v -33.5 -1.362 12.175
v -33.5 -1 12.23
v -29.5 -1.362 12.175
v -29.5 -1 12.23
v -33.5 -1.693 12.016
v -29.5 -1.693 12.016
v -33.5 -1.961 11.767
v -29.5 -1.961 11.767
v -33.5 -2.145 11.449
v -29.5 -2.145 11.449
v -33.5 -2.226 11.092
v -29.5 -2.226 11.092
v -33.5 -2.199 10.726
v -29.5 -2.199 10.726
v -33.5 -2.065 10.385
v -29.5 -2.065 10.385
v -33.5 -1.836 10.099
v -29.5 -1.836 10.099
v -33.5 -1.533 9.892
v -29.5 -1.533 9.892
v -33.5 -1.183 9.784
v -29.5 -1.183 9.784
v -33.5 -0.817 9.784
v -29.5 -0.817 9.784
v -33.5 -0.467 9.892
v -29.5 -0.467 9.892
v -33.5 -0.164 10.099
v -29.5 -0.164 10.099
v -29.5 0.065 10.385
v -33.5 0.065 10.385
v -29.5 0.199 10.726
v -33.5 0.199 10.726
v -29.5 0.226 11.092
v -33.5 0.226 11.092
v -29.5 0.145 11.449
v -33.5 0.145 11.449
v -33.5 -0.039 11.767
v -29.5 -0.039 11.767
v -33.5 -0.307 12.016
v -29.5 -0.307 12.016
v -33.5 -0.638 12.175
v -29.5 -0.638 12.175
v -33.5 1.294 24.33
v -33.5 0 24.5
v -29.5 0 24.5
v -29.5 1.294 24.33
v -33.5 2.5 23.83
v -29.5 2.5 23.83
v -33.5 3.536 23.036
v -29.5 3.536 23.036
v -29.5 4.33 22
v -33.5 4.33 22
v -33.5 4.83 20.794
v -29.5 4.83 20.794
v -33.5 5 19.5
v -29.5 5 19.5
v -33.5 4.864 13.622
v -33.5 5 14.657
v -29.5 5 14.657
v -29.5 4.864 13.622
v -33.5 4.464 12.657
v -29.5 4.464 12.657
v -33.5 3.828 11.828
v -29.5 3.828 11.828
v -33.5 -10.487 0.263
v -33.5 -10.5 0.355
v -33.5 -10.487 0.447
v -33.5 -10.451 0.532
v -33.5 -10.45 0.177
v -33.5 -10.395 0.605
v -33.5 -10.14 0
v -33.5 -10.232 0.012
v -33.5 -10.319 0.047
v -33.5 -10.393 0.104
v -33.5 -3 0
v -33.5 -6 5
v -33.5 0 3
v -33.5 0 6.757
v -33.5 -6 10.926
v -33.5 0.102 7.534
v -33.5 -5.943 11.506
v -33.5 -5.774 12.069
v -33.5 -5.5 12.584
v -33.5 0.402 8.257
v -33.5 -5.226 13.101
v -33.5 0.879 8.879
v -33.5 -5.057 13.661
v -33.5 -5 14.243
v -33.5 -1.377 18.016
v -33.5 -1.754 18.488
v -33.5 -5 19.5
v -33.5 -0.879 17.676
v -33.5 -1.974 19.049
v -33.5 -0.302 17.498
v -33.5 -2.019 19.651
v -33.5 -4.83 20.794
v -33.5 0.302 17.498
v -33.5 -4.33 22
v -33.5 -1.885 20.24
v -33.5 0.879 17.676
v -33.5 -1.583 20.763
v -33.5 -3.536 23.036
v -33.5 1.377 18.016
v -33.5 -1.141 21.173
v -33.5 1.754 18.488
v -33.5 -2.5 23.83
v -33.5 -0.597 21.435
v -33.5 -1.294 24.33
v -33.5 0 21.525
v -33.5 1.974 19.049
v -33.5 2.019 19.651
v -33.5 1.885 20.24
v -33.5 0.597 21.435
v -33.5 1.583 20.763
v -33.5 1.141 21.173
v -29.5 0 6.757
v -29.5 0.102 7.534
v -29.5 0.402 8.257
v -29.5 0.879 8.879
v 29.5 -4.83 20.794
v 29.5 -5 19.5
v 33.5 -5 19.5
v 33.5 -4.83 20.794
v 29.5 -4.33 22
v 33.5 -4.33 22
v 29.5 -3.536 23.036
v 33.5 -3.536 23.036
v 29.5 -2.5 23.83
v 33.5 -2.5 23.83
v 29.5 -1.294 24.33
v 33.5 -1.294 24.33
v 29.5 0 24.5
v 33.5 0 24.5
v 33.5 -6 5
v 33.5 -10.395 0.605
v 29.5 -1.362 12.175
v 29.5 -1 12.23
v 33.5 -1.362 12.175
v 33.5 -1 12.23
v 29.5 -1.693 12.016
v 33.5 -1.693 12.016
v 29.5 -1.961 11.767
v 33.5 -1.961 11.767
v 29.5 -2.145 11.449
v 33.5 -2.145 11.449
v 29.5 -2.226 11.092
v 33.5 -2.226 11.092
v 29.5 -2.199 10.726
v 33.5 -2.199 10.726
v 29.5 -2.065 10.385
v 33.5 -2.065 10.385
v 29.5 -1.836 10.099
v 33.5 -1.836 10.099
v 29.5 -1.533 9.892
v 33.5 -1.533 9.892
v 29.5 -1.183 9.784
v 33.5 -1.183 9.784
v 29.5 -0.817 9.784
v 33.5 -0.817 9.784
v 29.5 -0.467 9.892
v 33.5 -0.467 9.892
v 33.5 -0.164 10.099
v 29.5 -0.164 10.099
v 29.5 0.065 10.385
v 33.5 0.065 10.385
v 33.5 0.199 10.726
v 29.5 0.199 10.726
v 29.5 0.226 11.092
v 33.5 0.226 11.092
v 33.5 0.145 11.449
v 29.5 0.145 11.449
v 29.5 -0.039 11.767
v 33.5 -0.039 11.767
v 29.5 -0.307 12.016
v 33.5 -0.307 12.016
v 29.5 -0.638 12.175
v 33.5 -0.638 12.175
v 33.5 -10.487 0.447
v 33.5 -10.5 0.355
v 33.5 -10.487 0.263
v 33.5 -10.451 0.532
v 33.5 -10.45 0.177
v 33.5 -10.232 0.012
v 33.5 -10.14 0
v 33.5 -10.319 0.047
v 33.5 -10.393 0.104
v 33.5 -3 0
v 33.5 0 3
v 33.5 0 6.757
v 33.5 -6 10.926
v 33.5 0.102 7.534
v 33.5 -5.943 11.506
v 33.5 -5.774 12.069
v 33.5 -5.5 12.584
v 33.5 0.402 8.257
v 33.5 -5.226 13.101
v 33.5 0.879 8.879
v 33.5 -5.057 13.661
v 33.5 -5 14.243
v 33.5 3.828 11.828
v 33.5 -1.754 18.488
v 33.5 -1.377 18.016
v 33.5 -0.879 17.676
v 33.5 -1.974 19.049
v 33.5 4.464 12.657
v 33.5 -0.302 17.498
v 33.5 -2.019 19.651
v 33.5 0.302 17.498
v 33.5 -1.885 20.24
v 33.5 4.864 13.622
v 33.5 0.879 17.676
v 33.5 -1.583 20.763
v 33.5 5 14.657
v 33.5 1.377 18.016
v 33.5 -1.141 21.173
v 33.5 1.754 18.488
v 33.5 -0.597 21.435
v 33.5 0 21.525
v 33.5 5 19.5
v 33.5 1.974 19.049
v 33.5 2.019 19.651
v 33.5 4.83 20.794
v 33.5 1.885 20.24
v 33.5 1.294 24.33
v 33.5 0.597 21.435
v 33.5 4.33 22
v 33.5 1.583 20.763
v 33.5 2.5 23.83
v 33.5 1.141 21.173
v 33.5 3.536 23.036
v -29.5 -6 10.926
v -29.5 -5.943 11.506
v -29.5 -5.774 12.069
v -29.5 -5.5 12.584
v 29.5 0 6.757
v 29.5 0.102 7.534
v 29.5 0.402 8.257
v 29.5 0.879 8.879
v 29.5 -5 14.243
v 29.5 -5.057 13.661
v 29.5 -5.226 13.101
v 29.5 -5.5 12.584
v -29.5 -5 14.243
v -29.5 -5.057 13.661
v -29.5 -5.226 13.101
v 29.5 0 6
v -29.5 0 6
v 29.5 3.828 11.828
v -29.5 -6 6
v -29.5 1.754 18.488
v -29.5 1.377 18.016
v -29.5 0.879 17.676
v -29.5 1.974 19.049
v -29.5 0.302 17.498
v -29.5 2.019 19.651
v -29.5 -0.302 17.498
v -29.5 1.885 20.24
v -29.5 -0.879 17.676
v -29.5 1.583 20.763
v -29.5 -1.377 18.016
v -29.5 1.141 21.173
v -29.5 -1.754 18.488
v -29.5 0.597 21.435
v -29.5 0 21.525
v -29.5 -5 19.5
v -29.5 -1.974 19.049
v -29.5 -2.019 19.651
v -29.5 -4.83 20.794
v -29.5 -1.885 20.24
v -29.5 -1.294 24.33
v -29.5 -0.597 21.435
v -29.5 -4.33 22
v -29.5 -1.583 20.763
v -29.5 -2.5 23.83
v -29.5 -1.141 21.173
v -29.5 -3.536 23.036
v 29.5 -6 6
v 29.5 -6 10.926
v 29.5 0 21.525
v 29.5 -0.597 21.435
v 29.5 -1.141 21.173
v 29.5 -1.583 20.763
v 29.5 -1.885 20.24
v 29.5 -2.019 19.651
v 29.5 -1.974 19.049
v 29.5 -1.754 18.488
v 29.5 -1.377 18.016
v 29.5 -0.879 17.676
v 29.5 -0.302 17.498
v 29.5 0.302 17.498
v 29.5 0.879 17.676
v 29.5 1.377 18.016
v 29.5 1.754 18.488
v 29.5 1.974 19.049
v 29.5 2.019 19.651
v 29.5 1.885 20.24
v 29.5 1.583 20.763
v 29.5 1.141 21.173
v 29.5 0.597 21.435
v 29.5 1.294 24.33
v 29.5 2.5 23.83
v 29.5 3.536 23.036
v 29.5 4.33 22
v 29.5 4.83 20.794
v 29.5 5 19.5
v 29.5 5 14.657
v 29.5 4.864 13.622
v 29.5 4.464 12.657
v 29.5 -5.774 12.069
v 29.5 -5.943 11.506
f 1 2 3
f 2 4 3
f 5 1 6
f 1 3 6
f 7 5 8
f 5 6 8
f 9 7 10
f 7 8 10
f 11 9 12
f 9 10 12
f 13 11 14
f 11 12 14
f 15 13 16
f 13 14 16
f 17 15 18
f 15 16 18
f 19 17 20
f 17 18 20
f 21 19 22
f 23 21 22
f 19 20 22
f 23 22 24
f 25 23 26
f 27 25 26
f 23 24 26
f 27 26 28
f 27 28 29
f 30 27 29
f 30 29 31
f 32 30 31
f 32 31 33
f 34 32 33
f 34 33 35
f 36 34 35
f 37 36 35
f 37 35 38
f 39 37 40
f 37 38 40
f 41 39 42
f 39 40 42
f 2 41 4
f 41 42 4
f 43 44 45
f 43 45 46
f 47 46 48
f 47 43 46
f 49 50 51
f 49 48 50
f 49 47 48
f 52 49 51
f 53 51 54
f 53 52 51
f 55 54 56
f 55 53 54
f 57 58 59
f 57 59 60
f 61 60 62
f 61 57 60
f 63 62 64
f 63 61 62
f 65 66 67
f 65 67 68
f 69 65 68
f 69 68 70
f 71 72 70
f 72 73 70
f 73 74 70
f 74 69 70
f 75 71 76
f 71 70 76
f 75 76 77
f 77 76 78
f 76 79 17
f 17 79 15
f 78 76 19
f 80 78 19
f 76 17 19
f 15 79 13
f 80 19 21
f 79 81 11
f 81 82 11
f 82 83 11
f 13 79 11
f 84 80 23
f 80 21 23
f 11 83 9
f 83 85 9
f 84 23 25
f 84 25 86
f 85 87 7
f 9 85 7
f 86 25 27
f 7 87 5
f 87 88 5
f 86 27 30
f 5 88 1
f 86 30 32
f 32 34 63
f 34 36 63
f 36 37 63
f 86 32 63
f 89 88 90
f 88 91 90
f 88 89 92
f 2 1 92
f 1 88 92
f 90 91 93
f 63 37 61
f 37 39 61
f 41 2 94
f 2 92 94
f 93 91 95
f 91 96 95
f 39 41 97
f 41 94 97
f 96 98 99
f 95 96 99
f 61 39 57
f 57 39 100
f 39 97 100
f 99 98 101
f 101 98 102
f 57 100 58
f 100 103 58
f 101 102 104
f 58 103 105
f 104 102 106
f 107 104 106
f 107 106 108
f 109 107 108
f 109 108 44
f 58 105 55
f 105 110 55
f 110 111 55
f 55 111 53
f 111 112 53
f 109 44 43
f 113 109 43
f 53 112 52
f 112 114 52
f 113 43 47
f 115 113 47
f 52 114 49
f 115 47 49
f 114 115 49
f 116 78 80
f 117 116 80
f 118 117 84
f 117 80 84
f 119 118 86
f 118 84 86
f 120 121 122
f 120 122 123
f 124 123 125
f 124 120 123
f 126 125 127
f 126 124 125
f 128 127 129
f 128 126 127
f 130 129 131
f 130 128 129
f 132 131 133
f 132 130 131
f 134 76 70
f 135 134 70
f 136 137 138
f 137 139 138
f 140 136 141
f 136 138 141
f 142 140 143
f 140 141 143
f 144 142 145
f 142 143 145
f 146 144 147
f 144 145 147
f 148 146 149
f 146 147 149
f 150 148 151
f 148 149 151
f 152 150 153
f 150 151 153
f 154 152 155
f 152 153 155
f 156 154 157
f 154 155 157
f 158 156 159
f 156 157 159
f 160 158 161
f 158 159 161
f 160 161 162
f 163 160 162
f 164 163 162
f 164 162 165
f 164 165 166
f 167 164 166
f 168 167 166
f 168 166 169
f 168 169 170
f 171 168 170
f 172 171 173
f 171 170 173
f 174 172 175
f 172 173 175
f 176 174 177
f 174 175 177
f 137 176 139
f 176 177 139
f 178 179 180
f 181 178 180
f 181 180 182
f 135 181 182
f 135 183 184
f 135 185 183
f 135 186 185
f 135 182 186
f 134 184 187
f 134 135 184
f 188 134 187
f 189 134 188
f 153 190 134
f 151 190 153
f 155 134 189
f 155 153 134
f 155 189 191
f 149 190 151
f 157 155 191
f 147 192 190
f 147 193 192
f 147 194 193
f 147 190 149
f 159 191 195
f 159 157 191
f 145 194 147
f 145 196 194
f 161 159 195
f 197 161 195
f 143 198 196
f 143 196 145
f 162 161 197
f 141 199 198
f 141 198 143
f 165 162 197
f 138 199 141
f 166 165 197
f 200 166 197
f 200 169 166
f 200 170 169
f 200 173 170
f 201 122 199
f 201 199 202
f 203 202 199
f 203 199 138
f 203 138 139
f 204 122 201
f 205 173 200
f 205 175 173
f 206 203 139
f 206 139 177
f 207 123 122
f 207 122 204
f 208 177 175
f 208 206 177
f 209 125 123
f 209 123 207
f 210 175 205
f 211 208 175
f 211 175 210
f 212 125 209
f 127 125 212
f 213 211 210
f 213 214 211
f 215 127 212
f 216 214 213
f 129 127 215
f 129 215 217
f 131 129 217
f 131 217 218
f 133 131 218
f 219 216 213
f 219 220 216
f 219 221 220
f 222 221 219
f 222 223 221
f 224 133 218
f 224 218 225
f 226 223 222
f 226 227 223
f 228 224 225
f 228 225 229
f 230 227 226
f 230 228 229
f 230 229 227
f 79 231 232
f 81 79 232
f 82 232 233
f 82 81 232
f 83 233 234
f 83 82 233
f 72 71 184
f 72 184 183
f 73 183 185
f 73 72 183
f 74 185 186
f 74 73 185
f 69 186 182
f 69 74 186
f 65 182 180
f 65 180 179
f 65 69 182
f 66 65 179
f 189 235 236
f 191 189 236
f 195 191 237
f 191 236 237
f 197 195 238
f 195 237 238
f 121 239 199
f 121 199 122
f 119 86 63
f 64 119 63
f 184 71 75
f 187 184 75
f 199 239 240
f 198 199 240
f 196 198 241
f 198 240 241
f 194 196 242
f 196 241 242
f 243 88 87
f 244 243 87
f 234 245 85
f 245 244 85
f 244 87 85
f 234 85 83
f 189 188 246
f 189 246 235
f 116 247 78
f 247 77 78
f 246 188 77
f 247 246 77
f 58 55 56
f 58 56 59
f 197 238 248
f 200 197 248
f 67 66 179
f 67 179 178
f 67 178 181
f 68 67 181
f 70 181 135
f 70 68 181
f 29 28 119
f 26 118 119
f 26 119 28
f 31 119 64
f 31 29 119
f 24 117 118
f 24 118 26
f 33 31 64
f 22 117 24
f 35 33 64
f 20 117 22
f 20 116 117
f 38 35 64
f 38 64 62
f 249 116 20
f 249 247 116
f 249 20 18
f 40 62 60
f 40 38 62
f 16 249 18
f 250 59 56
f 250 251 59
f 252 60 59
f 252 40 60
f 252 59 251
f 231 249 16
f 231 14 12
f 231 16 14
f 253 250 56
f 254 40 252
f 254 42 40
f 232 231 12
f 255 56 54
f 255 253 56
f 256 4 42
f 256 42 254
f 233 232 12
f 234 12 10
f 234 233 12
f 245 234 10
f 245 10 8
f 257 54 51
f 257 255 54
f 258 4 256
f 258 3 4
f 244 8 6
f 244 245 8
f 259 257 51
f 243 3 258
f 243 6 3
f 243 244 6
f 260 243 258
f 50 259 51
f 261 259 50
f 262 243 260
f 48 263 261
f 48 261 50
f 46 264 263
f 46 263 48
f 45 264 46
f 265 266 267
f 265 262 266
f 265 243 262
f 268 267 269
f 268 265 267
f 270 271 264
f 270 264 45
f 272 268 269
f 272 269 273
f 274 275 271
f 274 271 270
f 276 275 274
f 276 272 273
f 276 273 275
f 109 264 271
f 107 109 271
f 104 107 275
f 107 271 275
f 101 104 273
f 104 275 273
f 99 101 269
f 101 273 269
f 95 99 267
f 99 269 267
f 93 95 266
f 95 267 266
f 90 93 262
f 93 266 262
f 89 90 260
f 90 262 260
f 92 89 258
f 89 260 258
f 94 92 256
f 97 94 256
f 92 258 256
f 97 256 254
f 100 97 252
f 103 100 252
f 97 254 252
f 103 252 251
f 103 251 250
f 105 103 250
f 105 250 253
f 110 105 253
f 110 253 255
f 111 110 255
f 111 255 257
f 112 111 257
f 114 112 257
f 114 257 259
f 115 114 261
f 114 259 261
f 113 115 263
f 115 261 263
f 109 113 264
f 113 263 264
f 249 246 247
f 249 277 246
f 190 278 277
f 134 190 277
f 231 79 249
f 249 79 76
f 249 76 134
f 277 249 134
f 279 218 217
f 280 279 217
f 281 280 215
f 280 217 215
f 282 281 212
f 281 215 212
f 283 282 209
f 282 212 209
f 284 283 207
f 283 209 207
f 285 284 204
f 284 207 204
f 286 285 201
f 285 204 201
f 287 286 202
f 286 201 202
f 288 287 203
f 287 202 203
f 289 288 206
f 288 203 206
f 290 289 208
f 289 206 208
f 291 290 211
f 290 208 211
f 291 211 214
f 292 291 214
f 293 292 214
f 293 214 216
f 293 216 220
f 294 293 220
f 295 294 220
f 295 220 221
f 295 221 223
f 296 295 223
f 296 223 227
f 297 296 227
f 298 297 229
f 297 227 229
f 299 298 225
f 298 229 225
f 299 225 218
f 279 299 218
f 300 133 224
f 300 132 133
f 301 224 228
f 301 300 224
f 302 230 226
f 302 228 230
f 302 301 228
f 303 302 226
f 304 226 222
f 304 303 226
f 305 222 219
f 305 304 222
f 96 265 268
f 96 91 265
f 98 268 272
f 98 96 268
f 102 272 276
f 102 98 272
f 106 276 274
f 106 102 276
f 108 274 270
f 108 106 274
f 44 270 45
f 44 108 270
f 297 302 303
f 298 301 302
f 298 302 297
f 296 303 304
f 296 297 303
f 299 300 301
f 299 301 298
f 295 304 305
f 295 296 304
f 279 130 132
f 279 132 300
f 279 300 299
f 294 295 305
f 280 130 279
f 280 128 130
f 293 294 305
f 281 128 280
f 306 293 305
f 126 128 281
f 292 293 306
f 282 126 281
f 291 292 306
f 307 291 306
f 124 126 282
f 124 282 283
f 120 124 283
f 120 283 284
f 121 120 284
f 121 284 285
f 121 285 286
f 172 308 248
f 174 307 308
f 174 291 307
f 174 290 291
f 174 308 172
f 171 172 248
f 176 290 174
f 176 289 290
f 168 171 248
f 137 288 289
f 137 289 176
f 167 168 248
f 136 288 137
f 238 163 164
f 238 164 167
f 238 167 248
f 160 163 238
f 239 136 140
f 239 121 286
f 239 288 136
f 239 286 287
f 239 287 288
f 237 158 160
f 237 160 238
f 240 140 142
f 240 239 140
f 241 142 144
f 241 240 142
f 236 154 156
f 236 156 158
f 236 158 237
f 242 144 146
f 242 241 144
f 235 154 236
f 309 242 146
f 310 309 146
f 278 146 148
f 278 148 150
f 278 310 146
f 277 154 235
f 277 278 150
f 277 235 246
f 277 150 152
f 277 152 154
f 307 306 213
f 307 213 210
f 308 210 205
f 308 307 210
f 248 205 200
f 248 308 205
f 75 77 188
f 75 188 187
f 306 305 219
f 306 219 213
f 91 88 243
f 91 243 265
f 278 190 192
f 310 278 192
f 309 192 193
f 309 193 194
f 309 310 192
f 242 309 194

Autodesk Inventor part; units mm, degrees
ref_plane "YZ Plane" through (0, 0, 0) normal (1, 0, 0) x (0, 1, 0)
ref_plane "XZ Plane" through (0, 0, 0) normal (0, 1, 0) x (-1, 0, 0)
ref_plane "XY Plane" through (0, 0, 0) normal (0, 0, 1) x (1, 0, 0)
sketch "Skizze1" plane through (0, 0, 0) normal (1, 0, 0) x (0, 1, 0)
  line L0 (-6, 5) -> (-10.5, 0.5)
  line L1 (-10.5, 0) -> (-3, 0)
  line L2 (0, 3) -> (0, 8)
  line L3 (-10.5, 0.5) -> (-10.5, 0)
  line L4 (0, 8) -> (5, 13)
  line L5 (0, 8) -> (0, 19.5) construction
  circle A0 centre (0, 19.5) radius 0.5
  line L6 (-5, 13) -> (-5, 24.5)
  line L7 (-5, 24.5) -> (5, 24.5)
  line L8 (5, 24.5) -> (5, 13)
  line L9 (0, 3) -> (-3, 0)
  line L10 (-5, 13) -> (-6, 12)
  line L11 (-6, 12) -> (-6, 5)
  line L12 (5, 13) -> (-5, 13) construction
  point P0 (0, 0)
  dimension "d40" = 0.5
  dimension "d41" = 10.5
  dimension "d44" = 1
  dimension "d56" = 5
  dimension "d58" = 19.5
  dimension "d59" = 10
  dimension "d60" = 45
  dimension "d61" = 8
  dimension "d62" = 3
  dimension "d63" = 45
  dimension "d67" = 1
extrude "Extrusion1" add sketch "Skizze1" along normal mid plane 67
sketch "Skizze6" plane through (0, 0, 0) normal (0, 1, 0) x (-1, 0, 0)
  line L0 (33.5, 0.5) -> (-33.5, 0.5) projected
  line L1 (-33.5, 5) -> (-33.5, 0.5) projected
  line L2 (33.5, 0.5) -> (33.5, 5) projected
  line L3 (-29.5, 6) -> (29.5, 6)
  line L4 (29.5, 6) -> (29.5, 36)
  line L5 (29.5, 36) -> (-29.5, 36)
  line L6 (-29.5, 36) -> (-29.5, 6)
  line L7 (0, -7.1) -> (0, 42.6) projected
  line L8 (33.5, 0) -> (-33.5, 0) projected
  line L9 (-33.5, 0) -> (33.5, 0) projected
  point P0 (0, 0)
  point P1 (-33, 10)
  point P2 (33, 10)
  dimension "d45" = 4
  dimension "d46" = 30
  dimension "d50" = 6
extrude "Extrusion4" cut sketch "Skizze6" along normal through all both and the other way through all
sketch "Skizze3" plane through (-33.5, 0, 0) normal (-1, 0, 0) x (0, 0, 1)
  line L0 (8, 0) -> (3, 0) projected
  line L1 (0, -3) -> (0, -10.5) projected
  line L2 (0.5, -10.5) -> (5, -6) projected
  line L3 (0, -10.5) -> (0, 0) construction
  line L4 (0, 8.1) -> (0, -13.6) projected
  line L5 (0, -10.5) -> (0.5, -10.5) projected
  line L6 (13, 5) -> (8, 0) projected
  line L7 (13, -5) -> (24.5, -5) projected
  line L8 (24.5, -5) -> (24.5, 5) projected
  line L9 (24.5, 5) -> (13, 5) projected
  circle A0 centre (19.5, 0) radius 0.5 projected
  line L10 (3, 0) -> (0, -3) projected
  line L11 (5, -6) -> (12, -6) projected
  line L12 (12, -6) -> (13, -5) projected
hole "Bohrung1" at (-33.5, 0, 19.5) direction (1, 0, 0) diameter 4.05 end through all
sketch "Skizze4" plane through (-33.5, 0, 0) normal (-1, 0, 0) x (0, 0, 1)
  line L0 (8, 0) -> (0, 0) projected
  line L1 (0, 8.1) -> (0, -13.6) projected
  point P0 (29, 0)
  point P1 (11, -1)
  dimension "d38" = 11
  dimension "d69" = 1
hole "Bohrung2" at (-33.5, -1, 11) direction (1, 0, 0) diameter 2.459 end through all thread size "M3x0.5" class "6H" standard "ISO Metric profile"
fillet "Rundung1" [suppressed]
fillet "Rundung2" radius 5 4 edges at (31.5, -5, 24.5) (31.5, 5, 24.5) (-31.5, 5, 24.5) (-31.5, -5, 24.5)
fillet "Rundung5" radius 4 2 edges at (31.5, 5, 13) (-31.5, 5, 13)
fillet "Rundung7" radius 3 6 edges at (-31.5, 0, 8) (31.5, 0, 8) (31.5, -6, 12) (31.5, -5, 13) (-31.5, -6, 12) (-31.5, -5, 13)
fillet "Rundung8" radius 0.36 2 edges at (0, -10.5, 0.5) (0, -10.5, 0)
properties part number "Chip Schaufel" material "Aluminium 6061"
